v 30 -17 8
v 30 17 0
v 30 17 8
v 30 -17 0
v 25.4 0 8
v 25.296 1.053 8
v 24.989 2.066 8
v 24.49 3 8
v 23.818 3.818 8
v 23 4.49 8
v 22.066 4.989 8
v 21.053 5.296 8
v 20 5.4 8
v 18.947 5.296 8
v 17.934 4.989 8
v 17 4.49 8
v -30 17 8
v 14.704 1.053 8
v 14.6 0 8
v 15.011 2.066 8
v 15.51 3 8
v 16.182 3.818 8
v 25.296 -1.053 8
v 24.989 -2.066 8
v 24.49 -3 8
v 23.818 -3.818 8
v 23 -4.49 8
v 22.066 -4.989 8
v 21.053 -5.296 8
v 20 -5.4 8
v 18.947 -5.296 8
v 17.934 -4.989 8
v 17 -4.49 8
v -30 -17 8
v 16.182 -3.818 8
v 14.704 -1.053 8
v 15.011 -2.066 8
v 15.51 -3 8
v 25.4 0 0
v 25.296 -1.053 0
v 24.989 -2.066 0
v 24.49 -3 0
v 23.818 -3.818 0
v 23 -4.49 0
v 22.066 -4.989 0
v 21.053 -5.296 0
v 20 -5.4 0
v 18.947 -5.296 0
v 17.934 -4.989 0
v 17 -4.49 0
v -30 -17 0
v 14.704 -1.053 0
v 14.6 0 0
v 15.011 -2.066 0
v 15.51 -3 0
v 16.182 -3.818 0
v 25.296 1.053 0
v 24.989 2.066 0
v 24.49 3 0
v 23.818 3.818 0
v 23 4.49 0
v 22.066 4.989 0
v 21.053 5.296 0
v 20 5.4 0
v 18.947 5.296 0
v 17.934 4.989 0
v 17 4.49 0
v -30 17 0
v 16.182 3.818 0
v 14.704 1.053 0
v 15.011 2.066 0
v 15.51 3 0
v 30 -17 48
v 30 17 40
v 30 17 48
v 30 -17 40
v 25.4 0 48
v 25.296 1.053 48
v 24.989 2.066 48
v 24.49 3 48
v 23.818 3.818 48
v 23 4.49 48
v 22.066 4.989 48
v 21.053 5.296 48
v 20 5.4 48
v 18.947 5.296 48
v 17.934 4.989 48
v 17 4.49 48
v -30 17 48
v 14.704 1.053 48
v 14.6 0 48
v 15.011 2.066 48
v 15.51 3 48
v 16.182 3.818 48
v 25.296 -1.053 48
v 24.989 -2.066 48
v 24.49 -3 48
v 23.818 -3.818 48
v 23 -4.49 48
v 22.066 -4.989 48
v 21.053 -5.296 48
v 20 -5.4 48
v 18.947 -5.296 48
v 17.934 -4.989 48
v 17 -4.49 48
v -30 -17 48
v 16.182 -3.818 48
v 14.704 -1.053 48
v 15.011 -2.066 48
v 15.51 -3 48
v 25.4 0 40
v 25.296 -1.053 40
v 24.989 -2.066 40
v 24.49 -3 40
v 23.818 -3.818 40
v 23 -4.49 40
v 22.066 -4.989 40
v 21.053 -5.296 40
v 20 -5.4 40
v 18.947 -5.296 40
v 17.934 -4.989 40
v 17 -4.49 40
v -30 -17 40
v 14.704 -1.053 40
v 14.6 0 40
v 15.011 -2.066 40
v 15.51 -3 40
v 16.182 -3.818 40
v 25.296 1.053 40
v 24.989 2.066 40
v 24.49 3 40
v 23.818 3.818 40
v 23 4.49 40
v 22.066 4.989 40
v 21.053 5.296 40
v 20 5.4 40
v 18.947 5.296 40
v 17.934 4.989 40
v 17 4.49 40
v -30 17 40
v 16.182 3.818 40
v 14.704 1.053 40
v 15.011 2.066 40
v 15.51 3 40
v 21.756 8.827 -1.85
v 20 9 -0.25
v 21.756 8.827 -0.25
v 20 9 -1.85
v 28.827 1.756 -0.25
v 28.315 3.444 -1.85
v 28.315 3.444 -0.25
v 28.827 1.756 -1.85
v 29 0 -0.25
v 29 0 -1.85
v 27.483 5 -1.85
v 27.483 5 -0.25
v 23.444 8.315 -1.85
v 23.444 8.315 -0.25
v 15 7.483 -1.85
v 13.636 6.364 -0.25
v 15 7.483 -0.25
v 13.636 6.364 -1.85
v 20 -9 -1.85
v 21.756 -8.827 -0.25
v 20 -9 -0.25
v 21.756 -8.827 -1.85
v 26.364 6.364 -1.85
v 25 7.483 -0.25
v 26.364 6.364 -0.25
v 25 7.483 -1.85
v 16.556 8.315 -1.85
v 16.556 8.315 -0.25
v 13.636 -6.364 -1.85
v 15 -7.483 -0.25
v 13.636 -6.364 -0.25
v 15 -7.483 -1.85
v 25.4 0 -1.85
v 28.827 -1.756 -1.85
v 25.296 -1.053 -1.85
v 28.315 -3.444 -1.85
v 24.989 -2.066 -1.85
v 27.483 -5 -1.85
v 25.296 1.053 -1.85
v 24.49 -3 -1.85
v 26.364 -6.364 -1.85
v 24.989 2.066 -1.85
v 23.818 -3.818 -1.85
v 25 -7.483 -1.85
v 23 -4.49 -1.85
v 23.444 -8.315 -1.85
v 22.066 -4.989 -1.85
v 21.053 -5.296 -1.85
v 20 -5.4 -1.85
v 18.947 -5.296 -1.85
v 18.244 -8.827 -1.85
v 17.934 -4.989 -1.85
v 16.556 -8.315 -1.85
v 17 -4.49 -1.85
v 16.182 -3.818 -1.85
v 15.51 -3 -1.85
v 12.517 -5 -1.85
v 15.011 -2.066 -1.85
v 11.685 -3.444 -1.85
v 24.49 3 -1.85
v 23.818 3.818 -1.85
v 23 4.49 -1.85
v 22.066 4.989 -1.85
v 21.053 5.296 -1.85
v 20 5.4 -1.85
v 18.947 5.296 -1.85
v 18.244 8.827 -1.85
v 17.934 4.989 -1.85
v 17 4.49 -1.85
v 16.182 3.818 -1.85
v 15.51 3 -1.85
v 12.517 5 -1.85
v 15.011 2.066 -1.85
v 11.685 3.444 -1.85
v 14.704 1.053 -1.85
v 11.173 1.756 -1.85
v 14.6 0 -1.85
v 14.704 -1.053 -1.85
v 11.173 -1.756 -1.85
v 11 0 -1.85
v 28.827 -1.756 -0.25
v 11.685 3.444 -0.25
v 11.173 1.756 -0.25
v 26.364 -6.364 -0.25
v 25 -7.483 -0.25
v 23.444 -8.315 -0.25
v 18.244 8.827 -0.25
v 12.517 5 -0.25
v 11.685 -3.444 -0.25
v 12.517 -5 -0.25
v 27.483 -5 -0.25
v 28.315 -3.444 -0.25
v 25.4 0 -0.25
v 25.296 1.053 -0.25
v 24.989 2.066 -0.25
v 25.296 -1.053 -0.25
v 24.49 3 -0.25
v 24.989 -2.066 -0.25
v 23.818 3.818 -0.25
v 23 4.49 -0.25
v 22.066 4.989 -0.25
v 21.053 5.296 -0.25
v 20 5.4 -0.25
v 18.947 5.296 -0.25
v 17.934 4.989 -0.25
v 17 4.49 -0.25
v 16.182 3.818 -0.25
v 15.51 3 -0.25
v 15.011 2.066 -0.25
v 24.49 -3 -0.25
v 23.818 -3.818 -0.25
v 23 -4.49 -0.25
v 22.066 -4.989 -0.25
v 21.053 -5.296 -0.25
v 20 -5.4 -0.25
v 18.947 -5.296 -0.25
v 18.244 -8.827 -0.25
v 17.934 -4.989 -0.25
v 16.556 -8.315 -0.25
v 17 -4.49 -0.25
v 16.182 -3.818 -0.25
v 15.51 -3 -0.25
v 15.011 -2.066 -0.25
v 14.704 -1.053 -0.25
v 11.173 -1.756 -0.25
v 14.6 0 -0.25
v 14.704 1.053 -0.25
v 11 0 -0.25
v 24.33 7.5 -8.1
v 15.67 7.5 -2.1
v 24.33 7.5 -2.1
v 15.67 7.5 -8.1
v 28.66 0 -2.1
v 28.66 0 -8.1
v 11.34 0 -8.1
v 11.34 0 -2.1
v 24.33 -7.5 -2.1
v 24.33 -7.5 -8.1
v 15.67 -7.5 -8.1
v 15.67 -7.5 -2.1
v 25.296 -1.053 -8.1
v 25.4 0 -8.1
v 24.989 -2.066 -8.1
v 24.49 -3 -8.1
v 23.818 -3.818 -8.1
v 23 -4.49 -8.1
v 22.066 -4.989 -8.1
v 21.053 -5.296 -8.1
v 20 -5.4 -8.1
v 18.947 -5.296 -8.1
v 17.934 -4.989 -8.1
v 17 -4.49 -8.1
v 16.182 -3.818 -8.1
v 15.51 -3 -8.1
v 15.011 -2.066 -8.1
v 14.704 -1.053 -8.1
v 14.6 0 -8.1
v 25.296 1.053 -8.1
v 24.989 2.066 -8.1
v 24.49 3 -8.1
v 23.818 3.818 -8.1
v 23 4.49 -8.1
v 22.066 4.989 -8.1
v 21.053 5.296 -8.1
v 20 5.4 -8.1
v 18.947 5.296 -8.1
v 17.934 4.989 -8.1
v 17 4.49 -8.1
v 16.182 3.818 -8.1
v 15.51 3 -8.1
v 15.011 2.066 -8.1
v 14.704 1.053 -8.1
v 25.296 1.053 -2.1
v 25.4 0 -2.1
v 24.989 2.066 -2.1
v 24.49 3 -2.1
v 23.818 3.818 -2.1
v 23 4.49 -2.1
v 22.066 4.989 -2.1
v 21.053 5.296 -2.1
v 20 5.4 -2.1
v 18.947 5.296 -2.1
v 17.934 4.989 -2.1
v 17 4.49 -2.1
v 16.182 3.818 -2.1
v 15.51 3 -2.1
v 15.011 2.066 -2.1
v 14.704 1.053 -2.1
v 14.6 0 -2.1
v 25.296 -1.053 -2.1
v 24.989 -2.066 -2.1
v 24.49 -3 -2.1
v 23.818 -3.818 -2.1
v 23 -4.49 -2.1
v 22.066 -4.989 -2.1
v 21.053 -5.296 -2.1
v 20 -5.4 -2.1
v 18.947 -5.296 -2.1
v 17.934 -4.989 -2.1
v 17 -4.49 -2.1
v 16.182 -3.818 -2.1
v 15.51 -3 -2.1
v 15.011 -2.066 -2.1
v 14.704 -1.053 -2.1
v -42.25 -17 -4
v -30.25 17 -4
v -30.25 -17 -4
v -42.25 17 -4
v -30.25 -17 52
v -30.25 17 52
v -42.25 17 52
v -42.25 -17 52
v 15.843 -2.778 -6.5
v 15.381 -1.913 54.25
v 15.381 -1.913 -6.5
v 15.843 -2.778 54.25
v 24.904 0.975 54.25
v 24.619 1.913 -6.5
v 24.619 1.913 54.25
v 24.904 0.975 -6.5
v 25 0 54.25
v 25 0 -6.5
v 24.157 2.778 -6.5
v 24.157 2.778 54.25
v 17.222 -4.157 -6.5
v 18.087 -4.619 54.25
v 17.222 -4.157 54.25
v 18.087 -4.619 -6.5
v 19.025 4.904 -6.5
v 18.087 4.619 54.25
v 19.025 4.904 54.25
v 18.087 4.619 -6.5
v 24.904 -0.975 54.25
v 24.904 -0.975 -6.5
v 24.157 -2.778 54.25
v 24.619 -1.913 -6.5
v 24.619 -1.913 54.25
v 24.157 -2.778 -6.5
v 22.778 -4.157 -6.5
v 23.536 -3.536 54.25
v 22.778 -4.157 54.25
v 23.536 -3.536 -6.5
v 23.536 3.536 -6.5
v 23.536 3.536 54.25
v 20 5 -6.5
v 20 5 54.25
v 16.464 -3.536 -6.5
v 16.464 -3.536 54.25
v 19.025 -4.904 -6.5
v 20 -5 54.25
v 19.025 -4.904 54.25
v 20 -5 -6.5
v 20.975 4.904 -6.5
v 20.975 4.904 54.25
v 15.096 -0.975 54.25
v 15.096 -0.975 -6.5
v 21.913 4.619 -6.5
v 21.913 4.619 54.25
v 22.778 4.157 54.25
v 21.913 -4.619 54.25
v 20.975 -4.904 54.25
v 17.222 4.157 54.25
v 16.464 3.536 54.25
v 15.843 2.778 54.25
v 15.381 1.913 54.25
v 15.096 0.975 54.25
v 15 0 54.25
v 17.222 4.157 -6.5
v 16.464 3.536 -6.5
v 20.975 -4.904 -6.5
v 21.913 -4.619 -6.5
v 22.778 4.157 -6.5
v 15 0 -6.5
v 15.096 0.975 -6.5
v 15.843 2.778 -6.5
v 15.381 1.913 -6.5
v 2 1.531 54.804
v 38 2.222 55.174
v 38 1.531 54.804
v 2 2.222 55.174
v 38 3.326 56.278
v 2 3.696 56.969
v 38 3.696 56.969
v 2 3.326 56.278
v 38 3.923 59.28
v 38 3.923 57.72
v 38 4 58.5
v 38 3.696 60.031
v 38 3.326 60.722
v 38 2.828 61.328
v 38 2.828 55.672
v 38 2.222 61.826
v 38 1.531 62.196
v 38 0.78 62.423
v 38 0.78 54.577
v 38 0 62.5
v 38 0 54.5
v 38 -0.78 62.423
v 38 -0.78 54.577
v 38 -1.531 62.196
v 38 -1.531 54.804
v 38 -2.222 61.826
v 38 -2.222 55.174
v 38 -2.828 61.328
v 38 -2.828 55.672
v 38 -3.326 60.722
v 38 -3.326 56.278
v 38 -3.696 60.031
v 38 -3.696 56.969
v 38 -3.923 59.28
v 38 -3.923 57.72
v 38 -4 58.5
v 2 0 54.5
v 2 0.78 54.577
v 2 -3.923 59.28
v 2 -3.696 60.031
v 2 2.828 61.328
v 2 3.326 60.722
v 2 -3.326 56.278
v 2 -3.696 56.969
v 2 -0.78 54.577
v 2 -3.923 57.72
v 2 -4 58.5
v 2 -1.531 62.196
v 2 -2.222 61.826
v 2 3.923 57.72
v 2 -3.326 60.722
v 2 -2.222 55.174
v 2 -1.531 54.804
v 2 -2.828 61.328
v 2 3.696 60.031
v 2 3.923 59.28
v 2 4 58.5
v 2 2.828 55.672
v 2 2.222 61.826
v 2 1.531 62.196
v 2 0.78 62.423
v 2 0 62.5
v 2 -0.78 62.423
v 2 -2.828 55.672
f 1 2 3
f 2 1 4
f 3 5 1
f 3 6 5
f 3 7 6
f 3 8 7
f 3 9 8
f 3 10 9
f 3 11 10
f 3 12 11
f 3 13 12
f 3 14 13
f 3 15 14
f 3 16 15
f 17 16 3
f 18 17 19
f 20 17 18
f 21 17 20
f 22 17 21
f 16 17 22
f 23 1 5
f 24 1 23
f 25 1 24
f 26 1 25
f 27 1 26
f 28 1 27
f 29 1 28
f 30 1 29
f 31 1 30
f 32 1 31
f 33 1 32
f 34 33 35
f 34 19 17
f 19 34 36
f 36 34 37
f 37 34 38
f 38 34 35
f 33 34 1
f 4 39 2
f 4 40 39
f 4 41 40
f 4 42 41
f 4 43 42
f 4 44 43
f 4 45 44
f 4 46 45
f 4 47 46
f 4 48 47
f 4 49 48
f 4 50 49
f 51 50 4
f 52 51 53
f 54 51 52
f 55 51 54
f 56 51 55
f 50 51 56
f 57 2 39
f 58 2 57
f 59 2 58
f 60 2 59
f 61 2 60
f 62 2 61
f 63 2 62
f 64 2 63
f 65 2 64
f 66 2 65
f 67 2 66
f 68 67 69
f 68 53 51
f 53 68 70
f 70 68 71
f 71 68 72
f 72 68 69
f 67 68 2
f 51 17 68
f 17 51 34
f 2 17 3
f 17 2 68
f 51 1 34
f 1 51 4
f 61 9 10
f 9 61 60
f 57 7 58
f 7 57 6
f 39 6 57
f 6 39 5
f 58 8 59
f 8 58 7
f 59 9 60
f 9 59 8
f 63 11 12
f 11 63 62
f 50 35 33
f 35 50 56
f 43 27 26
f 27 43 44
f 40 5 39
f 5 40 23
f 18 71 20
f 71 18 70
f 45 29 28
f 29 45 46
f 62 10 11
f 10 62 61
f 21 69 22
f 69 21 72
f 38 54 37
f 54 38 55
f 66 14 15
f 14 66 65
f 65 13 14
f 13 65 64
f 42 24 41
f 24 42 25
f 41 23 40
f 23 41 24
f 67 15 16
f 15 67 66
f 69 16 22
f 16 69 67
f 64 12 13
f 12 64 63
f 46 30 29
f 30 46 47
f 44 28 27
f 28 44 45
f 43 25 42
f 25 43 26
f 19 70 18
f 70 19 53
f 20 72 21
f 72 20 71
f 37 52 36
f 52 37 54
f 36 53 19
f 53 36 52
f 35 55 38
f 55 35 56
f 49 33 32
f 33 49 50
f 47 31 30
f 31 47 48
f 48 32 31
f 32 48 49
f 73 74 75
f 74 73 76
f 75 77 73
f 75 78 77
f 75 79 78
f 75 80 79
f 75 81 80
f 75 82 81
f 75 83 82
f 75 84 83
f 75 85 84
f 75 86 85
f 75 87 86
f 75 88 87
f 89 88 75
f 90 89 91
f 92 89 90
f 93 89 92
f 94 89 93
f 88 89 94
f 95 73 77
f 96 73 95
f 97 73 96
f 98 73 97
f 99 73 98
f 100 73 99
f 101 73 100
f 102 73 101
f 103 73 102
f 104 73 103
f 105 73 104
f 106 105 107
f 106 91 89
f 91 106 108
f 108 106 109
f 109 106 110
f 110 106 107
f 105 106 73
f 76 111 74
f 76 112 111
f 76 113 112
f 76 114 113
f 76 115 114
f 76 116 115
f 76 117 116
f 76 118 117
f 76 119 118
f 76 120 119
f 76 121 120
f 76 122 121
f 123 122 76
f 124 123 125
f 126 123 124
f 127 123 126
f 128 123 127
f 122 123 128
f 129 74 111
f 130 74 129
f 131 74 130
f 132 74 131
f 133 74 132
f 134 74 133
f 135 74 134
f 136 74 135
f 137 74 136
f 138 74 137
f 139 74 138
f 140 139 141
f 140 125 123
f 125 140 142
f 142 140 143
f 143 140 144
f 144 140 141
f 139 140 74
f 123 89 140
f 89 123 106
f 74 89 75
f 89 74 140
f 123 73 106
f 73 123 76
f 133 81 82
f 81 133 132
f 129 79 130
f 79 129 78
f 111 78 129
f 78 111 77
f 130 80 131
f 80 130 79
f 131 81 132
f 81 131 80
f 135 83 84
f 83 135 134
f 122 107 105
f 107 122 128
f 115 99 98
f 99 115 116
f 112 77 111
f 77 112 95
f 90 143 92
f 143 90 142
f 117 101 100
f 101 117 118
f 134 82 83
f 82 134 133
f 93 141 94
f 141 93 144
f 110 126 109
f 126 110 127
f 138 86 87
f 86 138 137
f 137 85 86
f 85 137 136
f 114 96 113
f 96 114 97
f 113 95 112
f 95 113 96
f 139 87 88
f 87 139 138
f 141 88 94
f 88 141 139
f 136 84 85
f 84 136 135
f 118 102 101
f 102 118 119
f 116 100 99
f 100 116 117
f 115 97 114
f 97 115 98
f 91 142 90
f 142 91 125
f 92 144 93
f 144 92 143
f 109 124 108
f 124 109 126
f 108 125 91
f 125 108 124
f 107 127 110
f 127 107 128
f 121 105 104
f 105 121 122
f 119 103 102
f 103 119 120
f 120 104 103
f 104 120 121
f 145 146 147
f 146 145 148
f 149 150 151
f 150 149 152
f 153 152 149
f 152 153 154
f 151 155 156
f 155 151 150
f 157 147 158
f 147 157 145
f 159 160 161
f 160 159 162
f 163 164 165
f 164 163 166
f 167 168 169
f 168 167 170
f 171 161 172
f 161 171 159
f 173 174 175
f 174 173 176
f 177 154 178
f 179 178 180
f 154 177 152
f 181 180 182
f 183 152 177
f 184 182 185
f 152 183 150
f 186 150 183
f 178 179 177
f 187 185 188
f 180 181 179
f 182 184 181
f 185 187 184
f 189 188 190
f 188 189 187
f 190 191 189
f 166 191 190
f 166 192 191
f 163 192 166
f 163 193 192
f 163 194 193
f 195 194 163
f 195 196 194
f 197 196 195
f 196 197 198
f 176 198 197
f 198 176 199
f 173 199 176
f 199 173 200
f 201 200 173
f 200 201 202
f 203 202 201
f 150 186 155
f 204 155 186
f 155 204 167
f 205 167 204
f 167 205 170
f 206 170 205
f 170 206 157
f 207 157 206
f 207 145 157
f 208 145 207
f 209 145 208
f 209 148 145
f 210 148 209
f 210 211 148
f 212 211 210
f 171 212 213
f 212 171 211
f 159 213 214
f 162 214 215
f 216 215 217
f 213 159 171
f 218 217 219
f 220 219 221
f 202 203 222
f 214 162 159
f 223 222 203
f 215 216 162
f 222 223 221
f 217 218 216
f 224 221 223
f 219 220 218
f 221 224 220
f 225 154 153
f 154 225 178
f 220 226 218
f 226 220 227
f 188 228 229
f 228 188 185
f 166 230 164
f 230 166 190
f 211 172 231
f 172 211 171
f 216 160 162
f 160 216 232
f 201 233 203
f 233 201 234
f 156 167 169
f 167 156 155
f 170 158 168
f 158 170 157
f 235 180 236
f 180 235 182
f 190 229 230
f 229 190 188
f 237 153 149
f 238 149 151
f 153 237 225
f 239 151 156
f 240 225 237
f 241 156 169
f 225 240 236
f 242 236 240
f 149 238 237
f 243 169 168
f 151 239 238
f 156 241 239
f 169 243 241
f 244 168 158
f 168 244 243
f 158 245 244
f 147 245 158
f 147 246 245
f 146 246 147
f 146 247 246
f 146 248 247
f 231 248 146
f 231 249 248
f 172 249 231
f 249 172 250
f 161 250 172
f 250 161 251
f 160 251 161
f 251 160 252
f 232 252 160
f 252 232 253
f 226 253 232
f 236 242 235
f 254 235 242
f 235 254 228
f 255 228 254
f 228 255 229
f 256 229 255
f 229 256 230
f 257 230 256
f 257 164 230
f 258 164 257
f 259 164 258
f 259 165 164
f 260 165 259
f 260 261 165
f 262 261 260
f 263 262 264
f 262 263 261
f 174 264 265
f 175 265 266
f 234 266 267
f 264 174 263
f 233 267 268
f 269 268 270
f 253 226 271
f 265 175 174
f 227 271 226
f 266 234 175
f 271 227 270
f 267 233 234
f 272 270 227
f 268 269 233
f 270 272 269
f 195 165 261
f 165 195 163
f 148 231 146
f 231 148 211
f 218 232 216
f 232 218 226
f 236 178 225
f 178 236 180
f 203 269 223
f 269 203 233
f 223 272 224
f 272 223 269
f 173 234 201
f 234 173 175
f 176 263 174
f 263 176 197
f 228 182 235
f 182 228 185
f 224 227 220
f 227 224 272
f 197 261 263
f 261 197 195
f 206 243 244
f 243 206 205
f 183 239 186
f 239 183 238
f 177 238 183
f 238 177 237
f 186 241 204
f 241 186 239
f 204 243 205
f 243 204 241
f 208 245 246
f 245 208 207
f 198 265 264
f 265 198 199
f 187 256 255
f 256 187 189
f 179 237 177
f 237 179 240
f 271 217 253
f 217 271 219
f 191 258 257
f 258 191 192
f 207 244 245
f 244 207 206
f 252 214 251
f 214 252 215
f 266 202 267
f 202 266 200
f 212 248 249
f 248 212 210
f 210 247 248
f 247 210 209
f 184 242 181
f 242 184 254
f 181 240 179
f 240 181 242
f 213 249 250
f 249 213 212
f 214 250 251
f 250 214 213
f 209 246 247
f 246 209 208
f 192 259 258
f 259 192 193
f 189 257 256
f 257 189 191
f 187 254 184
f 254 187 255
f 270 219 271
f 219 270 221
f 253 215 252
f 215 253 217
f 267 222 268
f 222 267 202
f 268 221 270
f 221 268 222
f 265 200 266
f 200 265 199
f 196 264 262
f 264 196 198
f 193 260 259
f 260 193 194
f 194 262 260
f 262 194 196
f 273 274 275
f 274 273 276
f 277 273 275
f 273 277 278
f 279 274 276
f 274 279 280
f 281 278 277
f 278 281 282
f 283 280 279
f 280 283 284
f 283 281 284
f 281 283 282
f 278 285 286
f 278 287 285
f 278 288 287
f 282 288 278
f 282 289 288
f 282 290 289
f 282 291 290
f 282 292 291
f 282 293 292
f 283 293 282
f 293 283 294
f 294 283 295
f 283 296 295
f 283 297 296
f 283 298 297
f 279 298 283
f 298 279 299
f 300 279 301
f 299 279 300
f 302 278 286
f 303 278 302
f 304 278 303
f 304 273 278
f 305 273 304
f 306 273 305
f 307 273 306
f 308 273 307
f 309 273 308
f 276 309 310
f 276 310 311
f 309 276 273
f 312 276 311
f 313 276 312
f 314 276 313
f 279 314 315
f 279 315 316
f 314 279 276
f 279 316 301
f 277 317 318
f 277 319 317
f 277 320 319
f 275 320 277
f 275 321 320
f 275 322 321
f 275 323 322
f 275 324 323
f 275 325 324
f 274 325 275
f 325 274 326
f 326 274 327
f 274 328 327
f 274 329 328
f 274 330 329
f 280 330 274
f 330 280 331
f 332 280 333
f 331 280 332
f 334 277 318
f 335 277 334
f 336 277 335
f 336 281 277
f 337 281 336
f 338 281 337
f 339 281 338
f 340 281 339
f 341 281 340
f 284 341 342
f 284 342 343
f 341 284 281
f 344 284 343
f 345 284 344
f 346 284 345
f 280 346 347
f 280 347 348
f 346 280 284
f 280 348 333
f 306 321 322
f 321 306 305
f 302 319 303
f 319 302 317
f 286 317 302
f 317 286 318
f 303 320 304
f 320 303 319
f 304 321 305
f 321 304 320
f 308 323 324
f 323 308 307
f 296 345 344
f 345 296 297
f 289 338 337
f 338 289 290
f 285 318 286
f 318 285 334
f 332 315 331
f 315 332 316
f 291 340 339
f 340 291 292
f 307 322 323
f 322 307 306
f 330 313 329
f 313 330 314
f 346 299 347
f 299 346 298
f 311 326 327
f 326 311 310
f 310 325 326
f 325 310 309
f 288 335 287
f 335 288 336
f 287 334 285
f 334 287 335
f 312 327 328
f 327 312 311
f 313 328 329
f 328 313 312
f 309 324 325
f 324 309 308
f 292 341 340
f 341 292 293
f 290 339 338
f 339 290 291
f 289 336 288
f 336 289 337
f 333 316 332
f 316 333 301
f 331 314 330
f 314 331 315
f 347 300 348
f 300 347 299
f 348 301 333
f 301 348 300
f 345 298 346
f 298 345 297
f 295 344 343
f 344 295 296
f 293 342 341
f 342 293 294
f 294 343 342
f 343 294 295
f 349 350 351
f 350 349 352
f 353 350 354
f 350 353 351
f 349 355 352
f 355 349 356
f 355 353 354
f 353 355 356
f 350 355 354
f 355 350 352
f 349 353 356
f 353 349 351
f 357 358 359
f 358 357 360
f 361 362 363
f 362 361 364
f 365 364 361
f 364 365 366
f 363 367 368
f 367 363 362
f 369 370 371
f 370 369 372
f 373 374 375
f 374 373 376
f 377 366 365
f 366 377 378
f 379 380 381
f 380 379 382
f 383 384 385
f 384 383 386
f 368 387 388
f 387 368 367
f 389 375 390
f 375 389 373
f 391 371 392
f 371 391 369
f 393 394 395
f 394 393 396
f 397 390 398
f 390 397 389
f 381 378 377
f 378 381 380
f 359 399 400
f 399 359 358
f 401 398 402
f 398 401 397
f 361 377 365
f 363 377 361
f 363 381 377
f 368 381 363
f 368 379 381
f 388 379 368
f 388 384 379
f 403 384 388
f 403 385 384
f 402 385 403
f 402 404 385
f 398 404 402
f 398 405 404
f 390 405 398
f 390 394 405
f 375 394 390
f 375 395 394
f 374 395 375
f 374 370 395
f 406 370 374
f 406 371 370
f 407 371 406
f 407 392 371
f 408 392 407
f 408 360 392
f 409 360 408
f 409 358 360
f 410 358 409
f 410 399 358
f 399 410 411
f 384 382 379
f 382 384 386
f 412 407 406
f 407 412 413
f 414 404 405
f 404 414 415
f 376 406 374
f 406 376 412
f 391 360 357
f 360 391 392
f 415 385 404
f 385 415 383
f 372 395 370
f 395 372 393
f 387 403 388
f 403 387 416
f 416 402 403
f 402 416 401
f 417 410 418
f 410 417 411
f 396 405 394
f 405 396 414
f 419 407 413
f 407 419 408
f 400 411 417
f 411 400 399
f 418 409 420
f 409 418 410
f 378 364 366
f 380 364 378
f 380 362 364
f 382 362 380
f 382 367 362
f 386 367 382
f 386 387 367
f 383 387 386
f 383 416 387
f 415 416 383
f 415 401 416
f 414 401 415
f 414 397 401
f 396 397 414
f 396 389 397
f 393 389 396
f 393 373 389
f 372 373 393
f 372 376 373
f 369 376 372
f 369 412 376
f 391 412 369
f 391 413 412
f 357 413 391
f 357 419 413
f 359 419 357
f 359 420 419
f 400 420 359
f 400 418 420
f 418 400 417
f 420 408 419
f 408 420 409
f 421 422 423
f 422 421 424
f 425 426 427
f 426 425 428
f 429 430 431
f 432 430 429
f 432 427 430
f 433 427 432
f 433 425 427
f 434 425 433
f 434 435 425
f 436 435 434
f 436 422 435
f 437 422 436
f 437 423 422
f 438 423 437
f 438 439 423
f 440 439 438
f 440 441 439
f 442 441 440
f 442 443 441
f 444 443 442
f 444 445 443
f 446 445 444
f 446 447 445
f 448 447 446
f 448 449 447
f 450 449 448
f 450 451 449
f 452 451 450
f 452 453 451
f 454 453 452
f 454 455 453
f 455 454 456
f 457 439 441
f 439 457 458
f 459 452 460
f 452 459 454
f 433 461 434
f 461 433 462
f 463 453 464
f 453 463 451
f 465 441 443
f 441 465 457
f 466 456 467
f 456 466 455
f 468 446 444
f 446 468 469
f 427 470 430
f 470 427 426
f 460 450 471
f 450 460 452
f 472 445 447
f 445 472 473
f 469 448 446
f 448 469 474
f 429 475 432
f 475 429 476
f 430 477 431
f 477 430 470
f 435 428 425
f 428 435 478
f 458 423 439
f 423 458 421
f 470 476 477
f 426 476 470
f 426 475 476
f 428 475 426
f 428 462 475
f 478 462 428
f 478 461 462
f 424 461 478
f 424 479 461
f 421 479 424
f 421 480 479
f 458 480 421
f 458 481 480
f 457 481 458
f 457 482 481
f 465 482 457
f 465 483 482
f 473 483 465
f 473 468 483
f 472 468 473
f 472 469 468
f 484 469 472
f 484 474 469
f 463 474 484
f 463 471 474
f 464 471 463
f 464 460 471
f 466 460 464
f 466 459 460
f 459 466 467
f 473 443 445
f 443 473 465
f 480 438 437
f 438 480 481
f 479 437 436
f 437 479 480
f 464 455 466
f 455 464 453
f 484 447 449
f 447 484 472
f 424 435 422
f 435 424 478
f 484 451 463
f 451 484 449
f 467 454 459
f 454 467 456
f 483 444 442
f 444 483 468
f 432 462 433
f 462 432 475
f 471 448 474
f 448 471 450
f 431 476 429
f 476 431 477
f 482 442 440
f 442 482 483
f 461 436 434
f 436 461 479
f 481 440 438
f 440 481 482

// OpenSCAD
$fn = 32;

// ------------------------------------------------------------------------
// C clamp: throat 40 mm, screw d10
// Every part is its own module, assembly() places every instance.
// ------------------------------------------------------------------------

// --- part 1 ---
module clamp_arm() {
  difference() {
    translate([-30, -17, 0]) cube([60, 34, 8]);
    translate([20, 0, -1]) cylinder(h = 10, d = 10.8);
  }
}

// --- part 2 ---
module clamp_spine() {
  difference() {
    translate([-28, -17, 0]) cube([56, 34, 12]);
  }
}

// --- part 3 ---
module clamp_screw() {
  translate([0, 0, -30.375]) cylinder(h = 60.75, d = 10);
}

// --- part 4 ---
module clamp_washer() {
  difference() {
      translate([0, 0, 0]) cylinder(h = 1.6, d = 18);
      translate([0, 0, -1]) cylinder(h = 3.6, d = 10.8);
    }
}

// --- part 5 ---
module clamp_nut() {
  difference() {
    linear_extrude(height = 6) polygon(points = [[8.66, 0], [4.33, 7.5], [-4.33, 7.5], [-8.66, 0], [-4.33, -7.5], [4.33, -7.5]]);
    translate([0, 0, -1]) cylinder(h = 8, d = 10.8);
  }
}

// --- part 6 ---
module tommy_bar() {
  translate([0, 0, -18]) cylinder(h = 36, d = 8);
}

// --- assembly ---
module assembly() {
  color([0.80, 0.24, 0.20]) translate([0, 0, 0]) rotate([0, 0, 0]) clamp_arm();
  color([0.20, 0.45, 0.75]) translate([0, 0, 40]) rotate([0, 0, 0]) clamp_arm();
  color([0.25, 0.62, 0.32]) translate([-42.25, 0, 24]) rotate([0, 90, 0]) clamp_spine();
  color([0.92, 0.70, 0.18]) translate([20, 0, 23.875]) rotate([0, 0, 0]) clamp_screw();
  color([0.58, 0.35, 0.70]) translate([20, 0, -1.85]) rotate([0, 0, 0]) clamp_washer();
  color([0.16, 0.66, 0.66]) translate([20, 0, -8.1]) rotate([0, 0, 0]) clamp_nut();
  color([0.85, 0.48, 0.18]) translate([20, 0, 58.5]) rotate([0, 90, 0]) tommy_bar();
}

assembly();
